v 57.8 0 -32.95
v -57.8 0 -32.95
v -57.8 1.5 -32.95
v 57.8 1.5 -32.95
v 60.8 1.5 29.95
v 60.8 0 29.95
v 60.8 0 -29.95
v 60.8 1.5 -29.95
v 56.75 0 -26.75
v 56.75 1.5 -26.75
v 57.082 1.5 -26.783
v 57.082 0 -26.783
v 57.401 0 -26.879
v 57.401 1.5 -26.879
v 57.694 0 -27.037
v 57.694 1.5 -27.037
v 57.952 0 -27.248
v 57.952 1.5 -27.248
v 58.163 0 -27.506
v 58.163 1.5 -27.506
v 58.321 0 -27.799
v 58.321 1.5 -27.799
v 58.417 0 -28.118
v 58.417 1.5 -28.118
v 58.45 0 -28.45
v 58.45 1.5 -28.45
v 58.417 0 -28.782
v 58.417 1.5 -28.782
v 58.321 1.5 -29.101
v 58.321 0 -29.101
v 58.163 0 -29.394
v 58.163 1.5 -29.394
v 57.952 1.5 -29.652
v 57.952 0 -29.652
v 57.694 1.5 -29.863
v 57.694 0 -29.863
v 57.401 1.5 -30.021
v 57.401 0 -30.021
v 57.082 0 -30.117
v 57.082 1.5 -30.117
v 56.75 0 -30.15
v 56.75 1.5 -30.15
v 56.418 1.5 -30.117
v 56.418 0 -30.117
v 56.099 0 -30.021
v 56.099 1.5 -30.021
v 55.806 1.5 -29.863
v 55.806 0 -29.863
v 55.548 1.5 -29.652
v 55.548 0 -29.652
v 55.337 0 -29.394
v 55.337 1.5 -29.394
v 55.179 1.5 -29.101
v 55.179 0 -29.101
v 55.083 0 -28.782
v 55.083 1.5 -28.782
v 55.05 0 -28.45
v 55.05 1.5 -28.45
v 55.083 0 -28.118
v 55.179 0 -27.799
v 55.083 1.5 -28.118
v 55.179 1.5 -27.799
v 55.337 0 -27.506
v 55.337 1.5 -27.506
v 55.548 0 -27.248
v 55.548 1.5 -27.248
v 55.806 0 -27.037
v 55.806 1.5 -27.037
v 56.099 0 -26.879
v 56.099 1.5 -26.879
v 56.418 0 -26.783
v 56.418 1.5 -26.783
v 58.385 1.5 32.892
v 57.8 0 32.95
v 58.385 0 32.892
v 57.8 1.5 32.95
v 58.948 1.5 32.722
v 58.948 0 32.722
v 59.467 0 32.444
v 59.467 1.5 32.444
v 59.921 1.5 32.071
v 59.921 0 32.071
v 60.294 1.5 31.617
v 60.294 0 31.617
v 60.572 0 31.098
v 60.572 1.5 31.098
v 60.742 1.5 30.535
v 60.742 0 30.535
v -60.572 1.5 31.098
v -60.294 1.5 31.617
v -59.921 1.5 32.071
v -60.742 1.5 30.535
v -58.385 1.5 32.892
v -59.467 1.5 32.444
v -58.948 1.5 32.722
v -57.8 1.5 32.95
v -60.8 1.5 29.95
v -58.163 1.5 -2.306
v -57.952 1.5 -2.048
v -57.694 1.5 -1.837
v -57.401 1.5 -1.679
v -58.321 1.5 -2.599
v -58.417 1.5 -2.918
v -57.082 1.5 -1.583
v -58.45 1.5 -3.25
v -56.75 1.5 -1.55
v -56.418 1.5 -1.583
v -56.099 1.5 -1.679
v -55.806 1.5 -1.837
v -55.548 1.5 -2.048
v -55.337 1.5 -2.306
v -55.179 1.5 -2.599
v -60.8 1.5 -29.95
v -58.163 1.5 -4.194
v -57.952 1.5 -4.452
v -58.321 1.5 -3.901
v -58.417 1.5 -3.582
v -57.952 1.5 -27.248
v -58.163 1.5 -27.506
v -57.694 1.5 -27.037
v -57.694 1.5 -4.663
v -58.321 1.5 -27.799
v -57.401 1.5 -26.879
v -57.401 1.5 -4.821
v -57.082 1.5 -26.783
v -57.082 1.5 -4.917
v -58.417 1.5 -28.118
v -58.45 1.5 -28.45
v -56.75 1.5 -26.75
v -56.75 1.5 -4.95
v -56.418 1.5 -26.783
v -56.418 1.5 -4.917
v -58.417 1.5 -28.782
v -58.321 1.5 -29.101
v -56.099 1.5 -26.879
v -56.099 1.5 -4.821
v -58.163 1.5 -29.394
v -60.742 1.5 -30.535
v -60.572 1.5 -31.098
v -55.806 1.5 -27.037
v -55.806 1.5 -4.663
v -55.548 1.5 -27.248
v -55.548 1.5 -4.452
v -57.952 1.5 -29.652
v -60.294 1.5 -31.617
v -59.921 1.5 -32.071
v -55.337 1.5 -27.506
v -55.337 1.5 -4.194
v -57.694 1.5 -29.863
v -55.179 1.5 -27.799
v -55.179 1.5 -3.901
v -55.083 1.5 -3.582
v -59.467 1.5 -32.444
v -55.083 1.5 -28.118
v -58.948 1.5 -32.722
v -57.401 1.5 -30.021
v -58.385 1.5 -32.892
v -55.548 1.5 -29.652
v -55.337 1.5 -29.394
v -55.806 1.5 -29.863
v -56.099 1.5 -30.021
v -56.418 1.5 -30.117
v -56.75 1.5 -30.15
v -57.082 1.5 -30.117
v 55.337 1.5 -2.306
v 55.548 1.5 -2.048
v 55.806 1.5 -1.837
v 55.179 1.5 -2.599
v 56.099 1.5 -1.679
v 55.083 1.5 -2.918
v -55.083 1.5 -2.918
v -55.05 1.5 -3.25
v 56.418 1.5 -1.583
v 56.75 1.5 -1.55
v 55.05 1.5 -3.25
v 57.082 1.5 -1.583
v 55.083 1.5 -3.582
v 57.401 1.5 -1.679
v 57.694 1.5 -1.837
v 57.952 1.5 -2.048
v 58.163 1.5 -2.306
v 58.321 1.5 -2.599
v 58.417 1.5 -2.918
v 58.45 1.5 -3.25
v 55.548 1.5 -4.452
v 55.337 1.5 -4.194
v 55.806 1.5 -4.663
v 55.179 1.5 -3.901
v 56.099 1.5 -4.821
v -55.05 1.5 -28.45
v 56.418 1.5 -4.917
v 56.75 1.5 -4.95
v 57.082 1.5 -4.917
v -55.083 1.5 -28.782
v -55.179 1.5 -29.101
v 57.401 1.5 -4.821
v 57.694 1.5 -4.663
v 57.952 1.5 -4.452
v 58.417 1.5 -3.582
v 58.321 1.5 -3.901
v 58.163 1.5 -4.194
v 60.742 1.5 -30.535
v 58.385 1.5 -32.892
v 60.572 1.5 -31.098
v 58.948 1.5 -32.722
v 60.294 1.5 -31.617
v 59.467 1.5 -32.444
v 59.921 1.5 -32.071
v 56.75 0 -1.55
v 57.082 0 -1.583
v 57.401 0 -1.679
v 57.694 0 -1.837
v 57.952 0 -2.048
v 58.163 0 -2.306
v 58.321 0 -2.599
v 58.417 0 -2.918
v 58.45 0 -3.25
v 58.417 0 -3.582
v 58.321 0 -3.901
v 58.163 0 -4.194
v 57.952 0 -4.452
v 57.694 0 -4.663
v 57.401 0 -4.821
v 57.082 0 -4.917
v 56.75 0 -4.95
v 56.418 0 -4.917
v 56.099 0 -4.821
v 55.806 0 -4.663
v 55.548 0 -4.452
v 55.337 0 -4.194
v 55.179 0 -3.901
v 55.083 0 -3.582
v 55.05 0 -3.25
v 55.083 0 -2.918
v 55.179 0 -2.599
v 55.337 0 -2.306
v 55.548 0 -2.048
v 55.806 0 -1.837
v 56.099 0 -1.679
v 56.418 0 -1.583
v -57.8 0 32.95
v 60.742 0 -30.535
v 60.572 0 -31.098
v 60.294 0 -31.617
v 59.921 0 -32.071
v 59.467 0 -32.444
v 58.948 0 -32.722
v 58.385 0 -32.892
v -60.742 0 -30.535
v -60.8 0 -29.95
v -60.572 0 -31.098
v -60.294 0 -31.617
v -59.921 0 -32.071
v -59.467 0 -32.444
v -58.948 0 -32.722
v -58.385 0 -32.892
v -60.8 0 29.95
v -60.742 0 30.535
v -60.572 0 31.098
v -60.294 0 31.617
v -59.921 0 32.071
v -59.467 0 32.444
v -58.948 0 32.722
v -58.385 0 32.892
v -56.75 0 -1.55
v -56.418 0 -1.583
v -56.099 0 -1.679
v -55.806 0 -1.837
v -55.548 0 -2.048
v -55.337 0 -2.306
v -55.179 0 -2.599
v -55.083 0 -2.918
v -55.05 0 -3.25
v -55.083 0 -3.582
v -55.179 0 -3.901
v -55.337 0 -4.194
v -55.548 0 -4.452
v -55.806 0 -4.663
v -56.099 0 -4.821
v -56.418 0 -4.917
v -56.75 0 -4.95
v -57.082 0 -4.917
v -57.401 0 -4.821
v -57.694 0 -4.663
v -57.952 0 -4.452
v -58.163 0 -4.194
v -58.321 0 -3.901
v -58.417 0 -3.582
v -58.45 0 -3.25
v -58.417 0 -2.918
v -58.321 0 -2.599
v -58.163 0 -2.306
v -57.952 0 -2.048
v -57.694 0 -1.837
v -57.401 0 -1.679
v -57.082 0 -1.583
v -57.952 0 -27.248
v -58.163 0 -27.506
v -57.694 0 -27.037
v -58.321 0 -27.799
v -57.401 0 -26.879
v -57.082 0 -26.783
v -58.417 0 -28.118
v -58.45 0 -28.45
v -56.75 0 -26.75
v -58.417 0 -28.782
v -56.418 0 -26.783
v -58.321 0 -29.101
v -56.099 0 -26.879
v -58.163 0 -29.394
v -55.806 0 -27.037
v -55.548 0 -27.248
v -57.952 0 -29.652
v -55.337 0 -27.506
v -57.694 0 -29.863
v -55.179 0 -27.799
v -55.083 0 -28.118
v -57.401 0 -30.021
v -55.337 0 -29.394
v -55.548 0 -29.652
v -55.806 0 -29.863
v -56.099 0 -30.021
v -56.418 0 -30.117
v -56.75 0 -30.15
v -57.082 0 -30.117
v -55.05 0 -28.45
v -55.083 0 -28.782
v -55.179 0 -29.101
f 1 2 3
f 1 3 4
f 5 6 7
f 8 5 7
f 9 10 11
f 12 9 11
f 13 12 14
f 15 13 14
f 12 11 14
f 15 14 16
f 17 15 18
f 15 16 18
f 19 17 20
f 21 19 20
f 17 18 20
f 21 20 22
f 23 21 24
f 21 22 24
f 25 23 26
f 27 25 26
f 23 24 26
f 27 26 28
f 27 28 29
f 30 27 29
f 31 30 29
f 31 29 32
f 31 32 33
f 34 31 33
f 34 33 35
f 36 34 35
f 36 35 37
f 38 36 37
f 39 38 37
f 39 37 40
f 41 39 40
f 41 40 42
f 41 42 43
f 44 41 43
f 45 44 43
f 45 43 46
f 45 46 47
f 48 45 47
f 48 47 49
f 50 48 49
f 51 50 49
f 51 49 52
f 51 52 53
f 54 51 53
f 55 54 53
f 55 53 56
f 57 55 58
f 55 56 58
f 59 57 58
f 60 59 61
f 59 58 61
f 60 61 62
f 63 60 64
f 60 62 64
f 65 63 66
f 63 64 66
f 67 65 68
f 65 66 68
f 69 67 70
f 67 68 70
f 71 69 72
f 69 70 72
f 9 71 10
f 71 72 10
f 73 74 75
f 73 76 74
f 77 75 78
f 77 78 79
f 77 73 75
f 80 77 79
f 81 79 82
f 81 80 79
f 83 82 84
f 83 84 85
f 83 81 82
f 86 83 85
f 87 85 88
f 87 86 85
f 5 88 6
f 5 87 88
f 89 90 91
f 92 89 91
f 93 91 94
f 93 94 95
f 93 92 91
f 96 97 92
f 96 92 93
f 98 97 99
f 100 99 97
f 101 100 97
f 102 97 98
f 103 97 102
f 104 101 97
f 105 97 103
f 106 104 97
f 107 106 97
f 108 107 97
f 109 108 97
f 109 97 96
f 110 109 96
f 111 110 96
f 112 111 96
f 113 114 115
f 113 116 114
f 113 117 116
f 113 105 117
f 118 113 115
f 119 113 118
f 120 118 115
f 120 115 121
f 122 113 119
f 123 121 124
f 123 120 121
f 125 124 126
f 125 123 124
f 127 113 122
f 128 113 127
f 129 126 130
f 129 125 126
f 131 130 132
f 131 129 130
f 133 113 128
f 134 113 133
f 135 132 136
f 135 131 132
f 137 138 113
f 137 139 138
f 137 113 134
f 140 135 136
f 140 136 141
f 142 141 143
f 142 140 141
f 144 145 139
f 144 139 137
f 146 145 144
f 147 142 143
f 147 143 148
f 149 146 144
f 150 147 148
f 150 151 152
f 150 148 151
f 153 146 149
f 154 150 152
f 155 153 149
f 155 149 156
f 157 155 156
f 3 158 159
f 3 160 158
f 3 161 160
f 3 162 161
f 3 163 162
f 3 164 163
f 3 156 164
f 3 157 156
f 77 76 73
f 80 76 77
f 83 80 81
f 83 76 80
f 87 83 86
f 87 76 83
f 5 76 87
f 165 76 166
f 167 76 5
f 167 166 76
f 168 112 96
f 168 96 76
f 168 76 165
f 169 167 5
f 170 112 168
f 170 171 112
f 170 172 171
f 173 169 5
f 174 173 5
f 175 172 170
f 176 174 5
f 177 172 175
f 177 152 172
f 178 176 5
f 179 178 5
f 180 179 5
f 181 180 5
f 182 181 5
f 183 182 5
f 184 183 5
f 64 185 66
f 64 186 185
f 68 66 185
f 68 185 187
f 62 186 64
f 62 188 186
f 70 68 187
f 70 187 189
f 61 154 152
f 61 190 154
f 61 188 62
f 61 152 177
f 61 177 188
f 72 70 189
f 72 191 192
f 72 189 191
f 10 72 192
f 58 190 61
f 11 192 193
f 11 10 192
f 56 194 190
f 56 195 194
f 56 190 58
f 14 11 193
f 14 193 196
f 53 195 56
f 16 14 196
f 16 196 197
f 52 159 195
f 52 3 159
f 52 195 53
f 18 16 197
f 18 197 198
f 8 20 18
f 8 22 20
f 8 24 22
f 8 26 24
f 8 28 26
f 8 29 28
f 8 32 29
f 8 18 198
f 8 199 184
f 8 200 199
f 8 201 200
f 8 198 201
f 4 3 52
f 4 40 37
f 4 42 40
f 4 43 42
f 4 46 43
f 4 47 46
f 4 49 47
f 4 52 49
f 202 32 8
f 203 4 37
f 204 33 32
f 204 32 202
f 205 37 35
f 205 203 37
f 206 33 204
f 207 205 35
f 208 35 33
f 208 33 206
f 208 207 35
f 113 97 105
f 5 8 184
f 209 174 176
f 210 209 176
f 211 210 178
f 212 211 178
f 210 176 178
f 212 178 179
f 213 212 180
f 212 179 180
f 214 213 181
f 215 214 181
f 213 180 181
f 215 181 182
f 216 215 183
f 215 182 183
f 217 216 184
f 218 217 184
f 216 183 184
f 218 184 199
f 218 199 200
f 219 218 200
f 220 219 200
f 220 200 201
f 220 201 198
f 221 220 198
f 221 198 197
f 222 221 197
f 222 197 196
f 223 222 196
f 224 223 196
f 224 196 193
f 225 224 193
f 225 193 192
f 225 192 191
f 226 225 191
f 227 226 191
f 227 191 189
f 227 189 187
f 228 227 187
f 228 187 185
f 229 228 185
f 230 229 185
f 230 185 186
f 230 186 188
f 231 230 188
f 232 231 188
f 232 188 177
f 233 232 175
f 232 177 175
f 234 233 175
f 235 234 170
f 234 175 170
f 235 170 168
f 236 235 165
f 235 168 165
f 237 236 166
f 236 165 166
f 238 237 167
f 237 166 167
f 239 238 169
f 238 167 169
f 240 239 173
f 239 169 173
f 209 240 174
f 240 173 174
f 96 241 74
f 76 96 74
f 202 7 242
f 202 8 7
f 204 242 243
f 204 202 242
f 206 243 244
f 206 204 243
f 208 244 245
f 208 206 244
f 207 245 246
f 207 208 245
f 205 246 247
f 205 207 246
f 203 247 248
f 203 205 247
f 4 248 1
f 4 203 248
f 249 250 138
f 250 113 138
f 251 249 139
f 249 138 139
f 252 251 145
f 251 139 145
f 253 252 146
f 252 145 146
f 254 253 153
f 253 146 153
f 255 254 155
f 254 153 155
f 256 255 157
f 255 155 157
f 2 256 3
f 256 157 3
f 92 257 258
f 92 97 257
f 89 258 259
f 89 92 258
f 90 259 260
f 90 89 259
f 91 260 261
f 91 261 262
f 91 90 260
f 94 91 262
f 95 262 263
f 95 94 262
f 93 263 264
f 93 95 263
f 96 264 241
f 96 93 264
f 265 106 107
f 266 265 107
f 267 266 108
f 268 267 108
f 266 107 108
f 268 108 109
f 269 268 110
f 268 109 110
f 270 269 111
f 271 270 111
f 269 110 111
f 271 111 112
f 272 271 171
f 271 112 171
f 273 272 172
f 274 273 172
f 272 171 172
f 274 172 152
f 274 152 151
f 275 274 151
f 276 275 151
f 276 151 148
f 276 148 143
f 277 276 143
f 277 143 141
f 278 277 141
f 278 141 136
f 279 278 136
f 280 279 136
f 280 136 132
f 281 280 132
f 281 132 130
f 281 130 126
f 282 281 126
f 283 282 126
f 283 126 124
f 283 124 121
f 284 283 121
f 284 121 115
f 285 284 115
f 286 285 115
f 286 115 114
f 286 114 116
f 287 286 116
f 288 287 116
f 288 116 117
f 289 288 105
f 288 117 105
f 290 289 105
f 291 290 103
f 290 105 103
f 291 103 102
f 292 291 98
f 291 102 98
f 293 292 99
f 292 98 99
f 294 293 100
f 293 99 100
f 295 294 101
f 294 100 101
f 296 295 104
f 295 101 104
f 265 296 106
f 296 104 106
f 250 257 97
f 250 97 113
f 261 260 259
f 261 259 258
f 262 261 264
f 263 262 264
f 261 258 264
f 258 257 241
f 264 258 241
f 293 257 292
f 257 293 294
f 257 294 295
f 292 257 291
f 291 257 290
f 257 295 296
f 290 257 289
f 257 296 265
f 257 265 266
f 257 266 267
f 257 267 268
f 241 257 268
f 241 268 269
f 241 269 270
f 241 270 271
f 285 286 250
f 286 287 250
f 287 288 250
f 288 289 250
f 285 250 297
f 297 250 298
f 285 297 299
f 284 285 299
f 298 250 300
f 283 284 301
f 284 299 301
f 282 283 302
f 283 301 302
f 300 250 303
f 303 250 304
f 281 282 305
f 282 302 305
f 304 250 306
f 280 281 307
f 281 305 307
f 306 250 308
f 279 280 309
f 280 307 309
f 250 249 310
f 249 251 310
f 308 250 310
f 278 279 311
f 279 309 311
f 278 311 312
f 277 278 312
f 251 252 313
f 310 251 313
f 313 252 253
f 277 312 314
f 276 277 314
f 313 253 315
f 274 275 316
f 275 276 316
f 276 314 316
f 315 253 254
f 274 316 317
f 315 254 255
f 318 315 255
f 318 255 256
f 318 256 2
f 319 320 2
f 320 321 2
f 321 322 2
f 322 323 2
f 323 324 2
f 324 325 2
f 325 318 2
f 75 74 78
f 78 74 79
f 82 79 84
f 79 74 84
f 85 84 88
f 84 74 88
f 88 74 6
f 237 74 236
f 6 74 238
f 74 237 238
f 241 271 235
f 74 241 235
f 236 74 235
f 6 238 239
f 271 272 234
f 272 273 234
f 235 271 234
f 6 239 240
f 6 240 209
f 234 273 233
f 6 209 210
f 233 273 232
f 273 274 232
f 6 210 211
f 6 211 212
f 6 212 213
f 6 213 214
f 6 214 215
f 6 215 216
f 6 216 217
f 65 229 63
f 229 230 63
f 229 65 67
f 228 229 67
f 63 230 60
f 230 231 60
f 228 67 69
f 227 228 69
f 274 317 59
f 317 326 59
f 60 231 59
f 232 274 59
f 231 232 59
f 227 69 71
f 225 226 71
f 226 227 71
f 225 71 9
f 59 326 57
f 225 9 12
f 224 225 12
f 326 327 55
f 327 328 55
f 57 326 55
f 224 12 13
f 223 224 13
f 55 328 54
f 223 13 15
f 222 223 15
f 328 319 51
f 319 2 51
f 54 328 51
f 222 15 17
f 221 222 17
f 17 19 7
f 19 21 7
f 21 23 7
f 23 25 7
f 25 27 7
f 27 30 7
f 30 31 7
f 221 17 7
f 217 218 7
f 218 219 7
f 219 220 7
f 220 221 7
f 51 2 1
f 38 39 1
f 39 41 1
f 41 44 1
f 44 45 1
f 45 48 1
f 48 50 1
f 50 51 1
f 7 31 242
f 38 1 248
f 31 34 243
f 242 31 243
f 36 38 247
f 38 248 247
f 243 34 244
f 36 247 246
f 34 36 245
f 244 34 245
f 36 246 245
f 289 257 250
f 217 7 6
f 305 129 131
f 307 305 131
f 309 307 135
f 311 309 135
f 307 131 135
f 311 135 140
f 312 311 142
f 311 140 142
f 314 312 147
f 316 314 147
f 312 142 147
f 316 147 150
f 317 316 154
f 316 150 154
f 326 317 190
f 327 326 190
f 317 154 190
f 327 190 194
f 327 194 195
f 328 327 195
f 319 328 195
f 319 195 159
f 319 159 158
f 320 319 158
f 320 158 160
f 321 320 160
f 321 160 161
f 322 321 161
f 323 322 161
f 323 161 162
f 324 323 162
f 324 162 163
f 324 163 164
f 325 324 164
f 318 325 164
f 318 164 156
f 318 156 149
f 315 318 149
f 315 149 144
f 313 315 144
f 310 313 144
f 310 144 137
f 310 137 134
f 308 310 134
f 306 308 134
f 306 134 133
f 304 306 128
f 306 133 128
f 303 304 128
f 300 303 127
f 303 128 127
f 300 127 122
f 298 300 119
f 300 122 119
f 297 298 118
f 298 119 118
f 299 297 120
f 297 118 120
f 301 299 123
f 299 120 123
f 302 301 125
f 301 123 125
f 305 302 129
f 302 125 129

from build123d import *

# Parameters (mm, degrees)
ESQUISSE1_W             = 121.6
ESQUISSE1_H             = 65.9
BOSS_EXTRU_1_DEPTH      = 1.5
CONG_1_R                = 3
ESQUISSE2_R             = 1.7
ENL_V_MAT_EXTRU_1_DEPTH = 70.170748876


with BuildPart() as part:
    # Esquisse1 → Boss.-Extru.1 (new body)
    with BuildSketch(Plane(origin=(0, 0, 0), x_dir=(1, 0, 0), z_dir=(0, 1, 0))):
        Rectangle(ESQUISSE1_W, ESQUISSE1_H)
    extrude(amount=BOSS_EXTRU_1_DEPTH)

    # Congé1
    cong_1_edges = [part.edges().sort_by_distance(p)[0] for p in [
        (60.8, 0.75, 32.95),
        (-60.8, 0.75, 32.95),
        (-60.8, 0.75, -32.95),
        (60.8, 0.75, -32.95),
    ]]
    fillet(cong_1_edges, radius=CONG_1_R)

    # Esquisse2 → Enlèv. mat.-Extru.1 (cut, through all)
    with BuildSketch(Plane(origin=(0, 1.5, 0), x_dir=(1, 0, 0), z_dir=(0, 1, 0))):
        with Locations(Location((-56.75, 28.45, 0), (0, 0, 270))):
            Circle(ESQUISSE2_R)
        with Locations(Location((-56.75, 3.25, 0), (0, 0, 270))):
            Circle(ESQUISSE2_R)
        with Locations(Location((56.75, 28.45, 0), (0, 0, 270))):
            Circle(ESQUISSE2_R)
        with Locations(Location((56.75, 3.25, 0), (0, 0, 270))):
            Circle(ESQUISSE2_R)
    extrude(amount=-ENL_V_MAT_EXTRU_1_DEPTH, mode=Mode.SUBTRACT)


solid = part.part
